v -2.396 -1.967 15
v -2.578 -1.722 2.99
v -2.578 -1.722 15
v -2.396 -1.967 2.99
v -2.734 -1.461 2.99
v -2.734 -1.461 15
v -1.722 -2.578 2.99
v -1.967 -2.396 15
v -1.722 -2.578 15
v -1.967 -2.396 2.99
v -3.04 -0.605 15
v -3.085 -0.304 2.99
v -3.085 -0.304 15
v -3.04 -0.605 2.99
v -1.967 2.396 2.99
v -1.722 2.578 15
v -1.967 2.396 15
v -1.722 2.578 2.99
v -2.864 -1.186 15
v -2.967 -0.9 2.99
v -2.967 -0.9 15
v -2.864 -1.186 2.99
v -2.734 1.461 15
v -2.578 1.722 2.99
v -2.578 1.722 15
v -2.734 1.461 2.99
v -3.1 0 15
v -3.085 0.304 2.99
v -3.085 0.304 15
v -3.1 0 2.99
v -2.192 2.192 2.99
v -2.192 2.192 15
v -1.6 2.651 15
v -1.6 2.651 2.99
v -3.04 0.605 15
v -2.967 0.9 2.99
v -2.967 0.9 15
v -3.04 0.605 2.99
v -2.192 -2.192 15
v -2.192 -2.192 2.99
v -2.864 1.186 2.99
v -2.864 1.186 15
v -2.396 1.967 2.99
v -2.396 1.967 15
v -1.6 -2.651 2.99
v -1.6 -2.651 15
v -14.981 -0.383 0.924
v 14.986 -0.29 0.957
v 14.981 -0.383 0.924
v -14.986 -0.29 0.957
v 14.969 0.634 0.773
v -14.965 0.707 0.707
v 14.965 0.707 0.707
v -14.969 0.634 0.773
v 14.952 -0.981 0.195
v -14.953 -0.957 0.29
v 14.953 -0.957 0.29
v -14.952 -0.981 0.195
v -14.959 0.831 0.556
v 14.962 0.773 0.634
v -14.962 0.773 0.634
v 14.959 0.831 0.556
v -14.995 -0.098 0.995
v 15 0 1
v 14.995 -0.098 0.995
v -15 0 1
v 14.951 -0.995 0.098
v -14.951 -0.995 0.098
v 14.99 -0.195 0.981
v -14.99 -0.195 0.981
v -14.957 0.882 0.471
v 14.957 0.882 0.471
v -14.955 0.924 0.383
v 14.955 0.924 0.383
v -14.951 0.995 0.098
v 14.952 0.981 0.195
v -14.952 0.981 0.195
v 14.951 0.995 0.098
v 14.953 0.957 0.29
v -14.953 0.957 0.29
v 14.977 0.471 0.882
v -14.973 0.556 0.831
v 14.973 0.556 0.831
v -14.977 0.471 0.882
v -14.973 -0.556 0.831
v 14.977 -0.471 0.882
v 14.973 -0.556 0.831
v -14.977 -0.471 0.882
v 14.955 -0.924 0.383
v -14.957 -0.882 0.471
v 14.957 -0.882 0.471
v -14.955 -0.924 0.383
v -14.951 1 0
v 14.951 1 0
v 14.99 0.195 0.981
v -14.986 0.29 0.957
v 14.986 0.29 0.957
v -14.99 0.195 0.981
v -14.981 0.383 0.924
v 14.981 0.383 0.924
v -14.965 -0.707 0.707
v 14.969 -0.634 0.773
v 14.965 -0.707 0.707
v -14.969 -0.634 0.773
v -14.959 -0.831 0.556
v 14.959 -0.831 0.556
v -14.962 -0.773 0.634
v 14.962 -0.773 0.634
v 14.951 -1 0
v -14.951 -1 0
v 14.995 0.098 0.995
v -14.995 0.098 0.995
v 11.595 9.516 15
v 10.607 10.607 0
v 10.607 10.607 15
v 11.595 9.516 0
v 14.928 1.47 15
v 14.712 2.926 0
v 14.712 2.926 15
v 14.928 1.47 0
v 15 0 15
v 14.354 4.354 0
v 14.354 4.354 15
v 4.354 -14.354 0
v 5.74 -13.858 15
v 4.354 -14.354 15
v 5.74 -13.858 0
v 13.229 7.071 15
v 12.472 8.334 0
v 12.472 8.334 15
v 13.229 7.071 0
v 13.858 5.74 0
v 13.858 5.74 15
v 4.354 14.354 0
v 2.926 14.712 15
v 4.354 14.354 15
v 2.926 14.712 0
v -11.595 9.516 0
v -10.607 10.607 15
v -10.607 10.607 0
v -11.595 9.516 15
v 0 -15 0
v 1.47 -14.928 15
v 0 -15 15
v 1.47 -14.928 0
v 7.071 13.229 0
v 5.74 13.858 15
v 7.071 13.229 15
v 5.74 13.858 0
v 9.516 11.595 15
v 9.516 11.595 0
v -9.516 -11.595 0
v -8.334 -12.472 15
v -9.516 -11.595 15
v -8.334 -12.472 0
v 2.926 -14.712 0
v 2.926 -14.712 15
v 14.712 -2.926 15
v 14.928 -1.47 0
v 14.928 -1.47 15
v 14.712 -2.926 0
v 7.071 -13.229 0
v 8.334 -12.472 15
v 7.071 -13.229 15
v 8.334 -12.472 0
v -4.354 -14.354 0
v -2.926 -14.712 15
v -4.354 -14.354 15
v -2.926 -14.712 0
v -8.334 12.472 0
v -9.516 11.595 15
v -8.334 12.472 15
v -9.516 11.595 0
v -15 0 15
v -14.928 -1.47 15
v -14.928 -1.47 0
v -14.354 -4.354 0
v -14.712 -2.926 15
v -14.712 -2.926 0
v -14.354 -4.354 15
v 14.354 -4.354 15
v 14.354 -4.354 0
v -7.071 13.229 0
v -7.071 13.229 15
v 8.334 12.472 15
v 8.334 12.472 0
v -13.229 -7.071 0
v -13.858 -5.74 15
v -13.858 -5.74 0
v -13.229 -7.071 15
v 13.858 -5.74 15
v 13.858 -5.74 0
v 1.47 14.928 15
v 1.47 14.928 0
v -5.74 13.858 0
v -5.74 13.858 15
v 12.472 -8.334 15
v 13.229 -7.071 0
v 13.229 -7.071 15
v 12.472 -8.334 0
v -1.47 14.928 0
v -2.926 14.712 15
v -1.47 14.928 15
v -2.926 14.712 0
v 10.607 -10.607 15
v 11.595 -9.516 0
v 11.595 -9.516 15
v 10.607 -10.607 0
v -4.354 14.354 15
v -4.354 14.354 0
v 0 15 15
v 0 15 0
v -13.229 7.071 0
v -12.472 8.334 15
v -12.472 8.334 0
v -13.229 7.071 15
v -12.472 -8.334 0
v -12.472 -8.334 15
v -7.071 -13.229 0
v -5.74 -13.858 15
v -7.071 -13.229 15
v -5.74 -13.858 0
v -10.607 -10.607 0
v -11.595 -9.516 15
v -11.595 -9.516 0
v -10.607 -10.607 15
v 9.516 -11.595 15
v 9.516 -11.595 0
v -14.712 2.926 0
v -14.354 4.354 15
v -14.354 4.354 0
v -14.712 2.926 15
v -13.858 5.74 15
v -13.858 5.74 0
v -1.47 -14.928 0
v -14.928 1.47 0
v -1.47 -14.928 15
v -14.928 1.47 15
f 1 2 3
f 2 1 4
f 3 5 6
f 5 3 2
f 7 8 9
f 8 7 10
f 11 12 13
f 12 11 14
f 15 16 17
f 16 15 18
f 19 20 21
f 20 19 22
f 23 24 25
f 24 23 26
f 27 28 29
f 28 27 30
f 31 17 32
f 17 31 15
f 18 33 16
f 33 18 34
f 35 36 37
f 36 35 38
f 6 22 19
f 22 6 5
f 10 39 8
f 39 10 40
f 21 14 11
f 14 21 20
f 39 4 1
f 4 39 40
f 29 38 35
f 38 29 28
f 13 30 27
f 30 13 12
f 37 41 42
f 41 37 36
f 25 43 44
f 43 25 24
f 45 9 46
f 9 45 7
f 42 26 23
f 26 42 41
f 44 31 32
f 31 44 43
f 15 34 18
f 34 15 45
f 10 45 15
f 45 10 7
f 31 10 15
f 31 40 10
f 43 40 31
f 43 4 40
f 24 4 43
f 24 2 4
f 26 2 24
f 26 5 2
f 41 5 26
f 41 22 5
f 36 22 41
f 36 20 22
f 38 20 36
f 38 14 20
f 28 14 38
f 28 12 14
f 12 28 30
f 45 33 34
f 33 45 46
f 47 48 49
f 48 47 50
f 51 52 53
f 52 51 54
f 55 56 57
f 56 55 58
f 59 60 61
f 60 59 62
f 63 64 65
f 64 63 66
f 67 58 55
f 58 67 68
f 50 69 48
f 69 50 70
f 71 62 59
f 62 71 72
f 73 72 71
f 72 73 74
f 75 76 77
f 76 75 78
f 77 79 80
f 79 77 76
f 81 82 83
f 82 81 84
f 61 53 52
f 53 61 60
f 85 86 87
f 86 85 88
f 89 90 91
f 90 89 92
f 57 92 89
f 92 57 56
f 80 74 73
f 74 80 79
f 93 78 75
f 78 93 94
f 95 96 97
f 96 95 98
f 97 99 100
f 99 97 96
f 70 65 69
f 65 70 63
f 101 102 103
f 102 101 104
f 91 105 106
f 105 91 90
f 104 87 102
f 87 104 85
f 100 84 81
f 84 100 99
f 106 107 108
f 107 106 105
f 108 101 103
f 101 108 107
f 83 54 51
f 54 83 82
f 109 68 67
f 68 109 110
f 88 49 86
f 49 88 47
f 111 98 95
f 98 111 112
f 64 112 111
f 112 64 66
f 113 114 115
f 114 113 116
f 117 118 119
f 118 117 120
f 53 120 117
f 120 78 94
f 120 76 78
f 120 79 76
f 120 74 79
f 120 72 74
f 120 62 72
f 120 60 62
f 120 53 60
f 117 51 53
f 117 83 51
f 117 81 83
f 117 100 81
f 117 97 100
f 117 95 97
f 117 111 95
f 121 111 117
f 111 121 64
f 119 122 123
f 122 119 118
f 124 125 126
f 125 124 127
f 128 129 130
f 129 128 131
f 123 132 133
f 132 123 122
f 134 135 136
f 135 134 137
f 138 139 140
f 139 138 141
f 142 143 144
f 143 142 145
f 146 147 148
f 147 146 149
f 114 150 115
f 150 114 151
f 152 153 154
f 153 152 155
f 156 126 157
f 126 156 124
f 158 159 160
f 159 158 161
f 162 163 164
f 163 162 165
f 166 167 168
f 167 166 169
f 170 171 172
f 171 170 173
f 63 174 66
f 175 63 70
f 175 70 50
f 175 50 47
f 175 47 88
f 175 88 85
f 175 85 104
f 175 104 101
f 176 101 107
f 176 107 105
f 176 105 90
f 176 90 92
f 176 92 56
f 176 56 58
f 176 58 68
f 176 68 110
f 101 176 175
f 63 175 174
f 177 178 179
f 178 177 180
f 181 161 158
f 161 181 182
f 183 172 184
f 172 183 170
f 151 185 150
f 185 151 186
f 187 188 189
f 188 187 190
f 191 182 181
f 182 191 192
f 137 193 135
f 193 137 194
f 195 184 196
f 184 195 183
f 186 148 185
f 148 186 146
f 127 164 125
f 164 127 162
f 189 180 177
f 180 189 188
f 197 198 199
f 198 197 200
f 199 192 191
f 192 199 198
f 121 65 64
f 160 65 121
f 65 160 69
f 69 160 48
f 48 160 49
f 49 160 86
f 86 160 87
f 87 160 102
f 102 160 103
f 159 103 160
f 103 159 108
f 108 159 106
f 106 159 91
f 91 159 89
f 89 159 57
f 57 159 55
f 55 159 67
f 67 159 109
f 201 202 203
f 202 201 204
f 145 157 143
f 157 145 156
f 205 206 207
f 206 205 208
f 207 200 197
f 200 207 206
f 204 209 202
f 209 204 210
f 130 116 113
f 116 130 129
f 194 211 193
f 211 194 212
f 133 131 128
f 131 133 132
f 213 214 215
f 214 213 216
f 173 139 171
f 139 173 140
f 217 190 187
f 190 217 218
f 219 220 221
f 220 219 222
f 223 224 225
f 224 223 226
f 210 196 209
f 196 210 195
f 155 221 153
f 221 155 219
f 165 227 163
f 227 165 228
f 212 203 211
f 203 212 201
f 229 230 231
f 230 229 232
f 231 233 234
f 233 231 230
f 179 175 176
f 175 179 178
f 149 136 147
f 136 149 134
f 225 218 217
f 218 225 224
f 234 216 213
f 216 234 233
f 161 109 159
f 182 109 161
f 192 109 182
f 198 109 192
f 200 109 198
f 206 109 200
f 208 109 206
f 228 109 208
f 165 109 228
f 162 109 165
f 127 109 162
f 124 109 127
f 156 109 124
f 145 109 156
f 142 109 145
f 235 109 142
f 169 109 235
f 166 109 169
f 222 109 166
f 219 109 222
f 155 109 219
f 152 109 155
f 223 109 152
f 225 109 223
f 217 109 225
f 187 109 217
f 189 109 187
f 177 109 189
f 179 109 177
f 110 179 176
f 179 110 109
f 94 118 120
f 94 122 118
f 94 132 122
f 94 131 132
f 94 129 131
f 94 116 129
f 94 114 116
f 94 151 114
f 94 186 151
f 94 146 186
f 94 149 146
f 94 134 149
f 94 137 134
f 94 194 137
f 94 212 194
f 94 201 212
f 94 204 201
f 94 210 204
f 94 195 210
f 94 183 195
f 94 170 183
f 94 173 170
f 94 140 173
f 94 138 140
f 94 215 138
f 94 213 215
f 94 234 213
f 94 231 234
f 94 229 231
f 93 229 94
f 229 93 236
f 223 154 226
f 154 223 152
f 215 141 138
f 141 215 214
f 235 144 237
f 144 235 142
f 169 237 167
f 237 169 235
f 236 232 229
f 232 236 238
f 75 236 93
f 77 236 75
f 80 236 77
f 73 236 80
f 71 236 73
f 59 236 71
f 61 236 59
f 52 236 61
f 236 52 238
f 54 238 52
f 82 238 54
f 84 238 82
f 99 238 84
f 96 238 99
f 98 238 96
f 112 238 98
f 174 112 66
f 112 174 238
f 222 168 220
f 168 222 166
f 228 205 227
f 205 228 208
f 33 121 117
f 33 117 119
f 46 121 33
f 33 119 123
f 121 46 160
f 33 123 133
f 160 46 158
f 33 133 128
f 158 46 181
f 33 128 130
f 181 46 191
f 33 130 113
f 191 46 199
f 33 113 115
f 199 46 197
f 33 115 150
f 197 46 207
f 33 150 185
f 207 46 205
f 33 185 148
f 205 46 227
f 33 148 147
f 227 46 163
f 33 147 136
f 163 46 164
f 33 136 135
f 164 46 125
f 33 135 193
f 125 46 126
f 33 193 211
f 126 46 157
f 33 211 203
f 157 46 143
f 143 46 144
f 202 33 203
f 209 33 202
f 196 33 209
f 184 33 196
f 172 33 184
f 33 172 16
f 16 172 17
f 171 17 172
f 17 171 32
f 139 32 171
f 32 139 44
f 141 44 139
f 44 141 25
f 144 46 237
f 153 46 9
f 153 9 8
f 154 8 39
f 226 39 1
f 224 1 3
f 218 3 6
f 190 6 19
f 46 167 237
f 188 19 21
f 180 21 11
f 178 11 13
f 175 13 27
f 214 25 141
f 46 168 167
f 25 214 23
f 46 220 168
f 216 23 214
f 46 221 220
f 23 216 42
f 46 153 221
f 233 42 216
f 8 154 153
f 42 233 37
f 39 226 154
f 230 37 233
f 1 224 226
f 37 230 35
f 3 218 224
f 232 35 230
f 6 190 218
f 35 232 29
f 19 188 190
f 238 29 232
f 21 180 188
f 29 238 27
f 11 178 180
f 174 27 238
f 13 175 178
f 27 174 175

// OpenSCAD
// Built by bench/smallmodels/features/compiler.py from a list of features.
$fn = 64;
difference() {
  union() {
    translate([0, 0, 0]) cylinder(d = 30, h = 15);
  }
  union() {
    translate([0, 0, 2.99]) rotate([0, 0, 0]) difference() { cylinder(d = 6.2, h = 12.02); translate([-1.6, -6.2, -1]) cube([6.2, 12.4, 14.02]); }
    translate([30, 0, 0]) rotate([0, 0, 0]) rotate([0, 90, 0]) cylinder(d = 2, h = 1060, center = true);
  }
}
